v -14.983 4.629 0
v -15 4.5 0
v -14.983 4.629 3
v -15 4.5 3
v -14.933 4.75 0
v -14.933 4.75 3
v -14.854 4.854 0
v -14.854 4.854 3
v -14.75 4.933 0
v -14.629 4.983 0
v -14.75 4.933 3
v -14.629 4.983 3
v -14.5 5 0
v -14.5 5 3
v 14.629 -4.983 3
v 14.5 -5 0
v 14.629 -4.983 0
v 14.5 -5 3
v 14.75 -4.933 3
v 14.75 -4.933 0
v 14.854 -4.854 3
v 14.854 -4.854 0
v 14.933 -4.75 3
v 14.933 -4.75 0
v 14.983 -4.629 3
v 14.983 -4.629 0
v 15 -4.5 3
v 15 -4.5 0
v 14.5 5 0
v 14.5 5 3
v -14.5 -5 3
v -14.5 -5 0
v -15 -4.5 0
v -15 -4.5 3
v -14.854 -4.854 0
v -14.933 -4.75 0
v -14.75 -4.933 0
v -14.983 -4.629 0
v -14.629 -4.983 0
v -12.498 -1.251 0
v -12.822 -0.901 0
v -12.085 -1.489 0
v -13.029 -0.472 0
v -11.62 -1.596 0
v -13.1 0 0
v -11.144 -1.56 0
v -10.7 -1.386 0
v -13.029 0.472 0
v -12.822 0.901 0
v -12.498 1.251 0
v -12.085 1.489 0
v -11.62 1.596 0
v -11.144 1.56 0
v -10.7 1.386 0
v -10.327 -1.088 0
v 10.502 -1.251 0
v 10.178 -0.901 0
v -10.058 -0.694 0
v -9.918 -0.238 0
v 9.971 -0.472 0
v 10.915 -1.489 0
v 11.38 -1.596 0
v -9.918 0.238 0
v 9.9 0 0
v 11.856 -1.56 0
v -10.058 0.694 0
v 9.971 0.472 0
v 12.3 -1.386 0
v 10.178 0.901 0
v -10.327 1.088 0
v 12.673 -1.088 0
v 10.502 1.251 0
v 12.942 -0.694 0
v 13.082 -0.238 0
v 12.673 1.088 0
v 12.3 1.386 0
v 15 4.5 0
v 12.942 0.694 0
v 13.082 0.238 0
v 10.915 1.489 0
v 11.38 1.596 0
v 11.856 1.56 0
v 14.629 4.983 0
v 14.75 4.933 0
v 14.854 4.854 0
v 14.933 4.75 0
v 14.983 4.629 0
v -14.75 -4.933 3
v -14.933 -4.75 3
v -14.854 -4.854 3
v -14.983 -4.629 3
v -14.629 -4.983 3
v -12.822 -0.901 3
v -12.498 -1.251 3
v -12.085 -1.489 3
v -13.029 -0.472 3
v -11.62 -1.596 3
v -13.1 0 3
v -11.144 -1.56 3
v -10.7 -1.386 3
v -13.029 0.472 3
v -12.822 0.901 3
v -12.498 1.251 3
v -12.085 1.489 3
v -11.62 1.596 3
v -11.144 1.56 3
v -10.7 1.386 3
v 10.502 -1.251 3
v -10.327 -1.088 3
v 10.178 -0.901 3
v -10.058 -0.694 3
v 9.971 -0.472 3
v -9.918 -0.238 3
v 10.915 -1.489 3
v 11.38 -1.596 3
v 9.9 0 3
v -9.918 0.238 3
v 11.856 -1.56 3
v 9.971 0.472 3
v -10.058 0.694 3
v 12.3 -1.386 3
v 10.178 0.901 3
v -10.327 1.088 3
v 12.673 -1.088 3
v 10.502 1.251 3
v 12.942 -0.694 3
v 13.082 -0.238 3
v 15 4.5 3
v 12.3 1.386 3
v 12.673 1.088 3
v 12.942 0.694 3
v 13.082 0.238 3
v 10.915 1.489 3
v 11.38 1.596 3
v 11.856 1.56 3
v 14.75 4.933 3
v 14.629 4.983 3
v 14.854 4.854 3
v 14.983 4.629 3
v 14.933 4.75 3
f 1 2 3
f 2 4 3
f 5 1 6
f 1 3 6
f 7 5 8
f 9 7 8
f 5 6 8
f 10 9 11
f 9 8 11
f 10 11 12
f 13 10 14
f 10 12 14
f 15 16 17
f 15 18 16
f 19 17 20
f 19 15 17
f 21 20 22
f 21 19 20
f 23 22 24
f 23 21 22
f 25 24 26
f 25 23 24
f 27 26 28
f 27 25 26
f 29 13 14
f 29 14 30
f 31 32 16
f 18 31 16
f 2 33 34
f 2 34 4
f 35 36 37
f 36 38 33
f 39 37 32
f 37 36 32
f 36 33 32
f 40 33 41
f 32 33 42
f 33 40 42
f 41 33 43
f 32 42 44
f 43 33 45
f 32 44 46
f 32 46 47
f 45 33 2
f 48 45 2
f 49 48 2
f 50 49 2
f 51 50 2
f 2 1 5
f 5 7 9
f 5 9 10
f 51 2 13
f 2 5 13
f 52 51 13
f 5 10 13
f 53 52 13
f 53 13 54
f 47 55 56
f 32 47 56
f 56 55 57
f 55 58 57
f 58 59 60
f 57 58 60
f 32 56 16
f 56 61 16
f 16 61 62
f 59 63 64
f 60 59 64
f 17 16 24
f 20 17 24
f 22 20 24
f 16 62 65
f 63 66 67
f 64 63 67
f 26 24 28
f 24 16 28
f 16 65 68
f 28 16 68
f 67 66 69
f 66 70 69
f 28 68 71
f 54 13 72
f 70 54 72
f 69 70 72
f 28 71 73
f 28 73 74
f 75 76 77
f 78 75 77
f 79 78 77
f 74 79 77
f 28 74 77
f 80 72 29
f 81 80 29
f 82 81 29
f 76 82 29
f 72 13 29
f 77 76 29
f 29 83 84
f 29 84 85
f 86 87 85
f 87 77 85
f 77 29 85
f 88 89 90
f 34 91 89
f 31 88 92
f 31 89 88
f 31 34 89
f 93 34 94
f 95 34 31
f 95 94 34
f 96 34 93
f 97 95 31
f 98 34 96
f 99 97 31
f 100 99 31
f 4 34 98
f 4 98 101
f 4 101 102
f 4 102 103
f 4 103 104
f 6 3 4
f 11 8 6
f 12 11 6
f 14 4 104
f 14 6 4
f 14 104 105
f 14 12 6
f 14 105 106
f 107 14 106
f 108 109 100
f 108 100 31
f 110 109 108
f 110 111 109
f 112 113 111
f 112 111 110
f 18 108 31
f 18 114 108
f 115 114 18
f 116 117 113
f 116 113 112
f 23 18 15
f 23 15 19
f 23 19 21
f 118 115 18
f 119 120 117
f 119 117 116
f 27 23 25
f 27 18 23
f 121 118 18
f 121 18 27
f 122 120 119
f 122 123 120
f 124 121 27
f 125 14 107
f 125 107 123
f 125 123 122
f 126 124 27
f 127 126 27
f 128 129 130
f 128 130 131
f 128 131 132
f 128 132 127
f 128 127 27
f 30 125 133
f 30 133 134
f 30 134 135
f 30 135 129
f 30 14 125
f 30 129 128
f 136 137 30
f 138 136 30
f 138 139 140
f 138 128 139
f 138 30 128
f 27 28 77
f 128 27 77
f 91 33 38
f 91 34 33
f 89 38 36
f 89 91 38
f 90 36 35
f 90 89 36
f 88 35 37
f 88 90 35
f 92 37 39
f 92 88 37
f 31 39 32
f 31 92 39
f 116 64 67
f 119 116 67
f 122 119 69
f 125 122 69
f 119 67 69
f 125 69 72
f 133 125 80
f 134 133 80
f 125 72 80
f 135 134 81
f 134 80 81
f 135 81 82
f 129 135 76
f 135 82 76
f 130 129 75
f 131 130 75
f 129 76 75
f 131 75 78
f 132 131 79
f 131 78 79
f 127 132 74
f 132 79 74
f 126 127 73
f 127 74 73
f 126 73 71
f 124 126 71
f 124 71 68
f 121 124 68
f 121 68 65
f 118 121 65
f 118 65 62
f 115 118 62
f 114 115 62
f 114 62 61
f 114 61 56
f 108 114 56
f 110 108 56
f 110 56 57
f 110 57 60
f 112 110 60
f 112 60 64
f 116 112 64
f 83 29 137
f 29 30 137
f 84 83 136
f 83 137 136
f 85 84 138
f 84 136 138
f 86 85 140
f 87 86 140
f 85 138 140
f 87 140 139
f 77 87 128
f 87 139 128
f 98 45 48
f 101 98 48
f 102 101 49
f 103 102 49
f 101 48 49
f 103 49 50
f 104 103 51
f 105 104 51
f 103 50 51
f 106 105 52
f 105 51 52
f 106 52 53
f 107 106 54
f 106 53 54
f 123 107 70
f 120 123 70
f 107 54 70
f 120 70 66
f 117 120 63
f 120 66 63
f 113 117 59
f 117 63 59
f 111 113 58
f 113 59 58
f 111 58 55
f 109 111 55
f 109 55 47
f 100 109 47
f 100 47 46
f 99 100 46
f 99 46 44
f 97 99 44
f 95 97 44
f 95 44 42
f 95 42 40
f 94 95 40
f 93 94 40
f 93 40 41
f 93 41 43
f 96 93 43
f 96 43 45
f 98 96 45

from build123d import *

# Parameters (mm, degrees)
SKETCH1_W            = 30
SKETCH1_H            = 10
BOSS_EXTRUDE1_DEPTH  = 3
M3_CLEARANCE_HOLE1_D = 3.2
FILLET1_R            = 0.5


with BuildPart() as part:
    # Sketch1 → Boss-Extrude1 (new body)
    with BuildSketch(Plane.XY):
        Rectangle(SKETCH1_W, SKETCH1_H)
    extrude(amount=BOSS_EXTRUDE1_DEPTH)

    # M3 Clearance Hole1 (through all)
    with Locations(Plane.XY.offset(3)):
        with Locations((-11.5, 0), (11.5, 0)):
            Hole(M3_CLEARANCE_HOLE1_D / 2)

    # Fillet1
    fillet1_edges = [part.edges().sort_by_distance(p)[0] for p in [
        (-15, 5, 1.5),
        (15, 5, 1.5),
        (15, -5, 1.5),
        (-15, -5, 1.5),
    ]]
    fillet(fillet1_edges, radius=FILLET1_R)


solid = part.part
